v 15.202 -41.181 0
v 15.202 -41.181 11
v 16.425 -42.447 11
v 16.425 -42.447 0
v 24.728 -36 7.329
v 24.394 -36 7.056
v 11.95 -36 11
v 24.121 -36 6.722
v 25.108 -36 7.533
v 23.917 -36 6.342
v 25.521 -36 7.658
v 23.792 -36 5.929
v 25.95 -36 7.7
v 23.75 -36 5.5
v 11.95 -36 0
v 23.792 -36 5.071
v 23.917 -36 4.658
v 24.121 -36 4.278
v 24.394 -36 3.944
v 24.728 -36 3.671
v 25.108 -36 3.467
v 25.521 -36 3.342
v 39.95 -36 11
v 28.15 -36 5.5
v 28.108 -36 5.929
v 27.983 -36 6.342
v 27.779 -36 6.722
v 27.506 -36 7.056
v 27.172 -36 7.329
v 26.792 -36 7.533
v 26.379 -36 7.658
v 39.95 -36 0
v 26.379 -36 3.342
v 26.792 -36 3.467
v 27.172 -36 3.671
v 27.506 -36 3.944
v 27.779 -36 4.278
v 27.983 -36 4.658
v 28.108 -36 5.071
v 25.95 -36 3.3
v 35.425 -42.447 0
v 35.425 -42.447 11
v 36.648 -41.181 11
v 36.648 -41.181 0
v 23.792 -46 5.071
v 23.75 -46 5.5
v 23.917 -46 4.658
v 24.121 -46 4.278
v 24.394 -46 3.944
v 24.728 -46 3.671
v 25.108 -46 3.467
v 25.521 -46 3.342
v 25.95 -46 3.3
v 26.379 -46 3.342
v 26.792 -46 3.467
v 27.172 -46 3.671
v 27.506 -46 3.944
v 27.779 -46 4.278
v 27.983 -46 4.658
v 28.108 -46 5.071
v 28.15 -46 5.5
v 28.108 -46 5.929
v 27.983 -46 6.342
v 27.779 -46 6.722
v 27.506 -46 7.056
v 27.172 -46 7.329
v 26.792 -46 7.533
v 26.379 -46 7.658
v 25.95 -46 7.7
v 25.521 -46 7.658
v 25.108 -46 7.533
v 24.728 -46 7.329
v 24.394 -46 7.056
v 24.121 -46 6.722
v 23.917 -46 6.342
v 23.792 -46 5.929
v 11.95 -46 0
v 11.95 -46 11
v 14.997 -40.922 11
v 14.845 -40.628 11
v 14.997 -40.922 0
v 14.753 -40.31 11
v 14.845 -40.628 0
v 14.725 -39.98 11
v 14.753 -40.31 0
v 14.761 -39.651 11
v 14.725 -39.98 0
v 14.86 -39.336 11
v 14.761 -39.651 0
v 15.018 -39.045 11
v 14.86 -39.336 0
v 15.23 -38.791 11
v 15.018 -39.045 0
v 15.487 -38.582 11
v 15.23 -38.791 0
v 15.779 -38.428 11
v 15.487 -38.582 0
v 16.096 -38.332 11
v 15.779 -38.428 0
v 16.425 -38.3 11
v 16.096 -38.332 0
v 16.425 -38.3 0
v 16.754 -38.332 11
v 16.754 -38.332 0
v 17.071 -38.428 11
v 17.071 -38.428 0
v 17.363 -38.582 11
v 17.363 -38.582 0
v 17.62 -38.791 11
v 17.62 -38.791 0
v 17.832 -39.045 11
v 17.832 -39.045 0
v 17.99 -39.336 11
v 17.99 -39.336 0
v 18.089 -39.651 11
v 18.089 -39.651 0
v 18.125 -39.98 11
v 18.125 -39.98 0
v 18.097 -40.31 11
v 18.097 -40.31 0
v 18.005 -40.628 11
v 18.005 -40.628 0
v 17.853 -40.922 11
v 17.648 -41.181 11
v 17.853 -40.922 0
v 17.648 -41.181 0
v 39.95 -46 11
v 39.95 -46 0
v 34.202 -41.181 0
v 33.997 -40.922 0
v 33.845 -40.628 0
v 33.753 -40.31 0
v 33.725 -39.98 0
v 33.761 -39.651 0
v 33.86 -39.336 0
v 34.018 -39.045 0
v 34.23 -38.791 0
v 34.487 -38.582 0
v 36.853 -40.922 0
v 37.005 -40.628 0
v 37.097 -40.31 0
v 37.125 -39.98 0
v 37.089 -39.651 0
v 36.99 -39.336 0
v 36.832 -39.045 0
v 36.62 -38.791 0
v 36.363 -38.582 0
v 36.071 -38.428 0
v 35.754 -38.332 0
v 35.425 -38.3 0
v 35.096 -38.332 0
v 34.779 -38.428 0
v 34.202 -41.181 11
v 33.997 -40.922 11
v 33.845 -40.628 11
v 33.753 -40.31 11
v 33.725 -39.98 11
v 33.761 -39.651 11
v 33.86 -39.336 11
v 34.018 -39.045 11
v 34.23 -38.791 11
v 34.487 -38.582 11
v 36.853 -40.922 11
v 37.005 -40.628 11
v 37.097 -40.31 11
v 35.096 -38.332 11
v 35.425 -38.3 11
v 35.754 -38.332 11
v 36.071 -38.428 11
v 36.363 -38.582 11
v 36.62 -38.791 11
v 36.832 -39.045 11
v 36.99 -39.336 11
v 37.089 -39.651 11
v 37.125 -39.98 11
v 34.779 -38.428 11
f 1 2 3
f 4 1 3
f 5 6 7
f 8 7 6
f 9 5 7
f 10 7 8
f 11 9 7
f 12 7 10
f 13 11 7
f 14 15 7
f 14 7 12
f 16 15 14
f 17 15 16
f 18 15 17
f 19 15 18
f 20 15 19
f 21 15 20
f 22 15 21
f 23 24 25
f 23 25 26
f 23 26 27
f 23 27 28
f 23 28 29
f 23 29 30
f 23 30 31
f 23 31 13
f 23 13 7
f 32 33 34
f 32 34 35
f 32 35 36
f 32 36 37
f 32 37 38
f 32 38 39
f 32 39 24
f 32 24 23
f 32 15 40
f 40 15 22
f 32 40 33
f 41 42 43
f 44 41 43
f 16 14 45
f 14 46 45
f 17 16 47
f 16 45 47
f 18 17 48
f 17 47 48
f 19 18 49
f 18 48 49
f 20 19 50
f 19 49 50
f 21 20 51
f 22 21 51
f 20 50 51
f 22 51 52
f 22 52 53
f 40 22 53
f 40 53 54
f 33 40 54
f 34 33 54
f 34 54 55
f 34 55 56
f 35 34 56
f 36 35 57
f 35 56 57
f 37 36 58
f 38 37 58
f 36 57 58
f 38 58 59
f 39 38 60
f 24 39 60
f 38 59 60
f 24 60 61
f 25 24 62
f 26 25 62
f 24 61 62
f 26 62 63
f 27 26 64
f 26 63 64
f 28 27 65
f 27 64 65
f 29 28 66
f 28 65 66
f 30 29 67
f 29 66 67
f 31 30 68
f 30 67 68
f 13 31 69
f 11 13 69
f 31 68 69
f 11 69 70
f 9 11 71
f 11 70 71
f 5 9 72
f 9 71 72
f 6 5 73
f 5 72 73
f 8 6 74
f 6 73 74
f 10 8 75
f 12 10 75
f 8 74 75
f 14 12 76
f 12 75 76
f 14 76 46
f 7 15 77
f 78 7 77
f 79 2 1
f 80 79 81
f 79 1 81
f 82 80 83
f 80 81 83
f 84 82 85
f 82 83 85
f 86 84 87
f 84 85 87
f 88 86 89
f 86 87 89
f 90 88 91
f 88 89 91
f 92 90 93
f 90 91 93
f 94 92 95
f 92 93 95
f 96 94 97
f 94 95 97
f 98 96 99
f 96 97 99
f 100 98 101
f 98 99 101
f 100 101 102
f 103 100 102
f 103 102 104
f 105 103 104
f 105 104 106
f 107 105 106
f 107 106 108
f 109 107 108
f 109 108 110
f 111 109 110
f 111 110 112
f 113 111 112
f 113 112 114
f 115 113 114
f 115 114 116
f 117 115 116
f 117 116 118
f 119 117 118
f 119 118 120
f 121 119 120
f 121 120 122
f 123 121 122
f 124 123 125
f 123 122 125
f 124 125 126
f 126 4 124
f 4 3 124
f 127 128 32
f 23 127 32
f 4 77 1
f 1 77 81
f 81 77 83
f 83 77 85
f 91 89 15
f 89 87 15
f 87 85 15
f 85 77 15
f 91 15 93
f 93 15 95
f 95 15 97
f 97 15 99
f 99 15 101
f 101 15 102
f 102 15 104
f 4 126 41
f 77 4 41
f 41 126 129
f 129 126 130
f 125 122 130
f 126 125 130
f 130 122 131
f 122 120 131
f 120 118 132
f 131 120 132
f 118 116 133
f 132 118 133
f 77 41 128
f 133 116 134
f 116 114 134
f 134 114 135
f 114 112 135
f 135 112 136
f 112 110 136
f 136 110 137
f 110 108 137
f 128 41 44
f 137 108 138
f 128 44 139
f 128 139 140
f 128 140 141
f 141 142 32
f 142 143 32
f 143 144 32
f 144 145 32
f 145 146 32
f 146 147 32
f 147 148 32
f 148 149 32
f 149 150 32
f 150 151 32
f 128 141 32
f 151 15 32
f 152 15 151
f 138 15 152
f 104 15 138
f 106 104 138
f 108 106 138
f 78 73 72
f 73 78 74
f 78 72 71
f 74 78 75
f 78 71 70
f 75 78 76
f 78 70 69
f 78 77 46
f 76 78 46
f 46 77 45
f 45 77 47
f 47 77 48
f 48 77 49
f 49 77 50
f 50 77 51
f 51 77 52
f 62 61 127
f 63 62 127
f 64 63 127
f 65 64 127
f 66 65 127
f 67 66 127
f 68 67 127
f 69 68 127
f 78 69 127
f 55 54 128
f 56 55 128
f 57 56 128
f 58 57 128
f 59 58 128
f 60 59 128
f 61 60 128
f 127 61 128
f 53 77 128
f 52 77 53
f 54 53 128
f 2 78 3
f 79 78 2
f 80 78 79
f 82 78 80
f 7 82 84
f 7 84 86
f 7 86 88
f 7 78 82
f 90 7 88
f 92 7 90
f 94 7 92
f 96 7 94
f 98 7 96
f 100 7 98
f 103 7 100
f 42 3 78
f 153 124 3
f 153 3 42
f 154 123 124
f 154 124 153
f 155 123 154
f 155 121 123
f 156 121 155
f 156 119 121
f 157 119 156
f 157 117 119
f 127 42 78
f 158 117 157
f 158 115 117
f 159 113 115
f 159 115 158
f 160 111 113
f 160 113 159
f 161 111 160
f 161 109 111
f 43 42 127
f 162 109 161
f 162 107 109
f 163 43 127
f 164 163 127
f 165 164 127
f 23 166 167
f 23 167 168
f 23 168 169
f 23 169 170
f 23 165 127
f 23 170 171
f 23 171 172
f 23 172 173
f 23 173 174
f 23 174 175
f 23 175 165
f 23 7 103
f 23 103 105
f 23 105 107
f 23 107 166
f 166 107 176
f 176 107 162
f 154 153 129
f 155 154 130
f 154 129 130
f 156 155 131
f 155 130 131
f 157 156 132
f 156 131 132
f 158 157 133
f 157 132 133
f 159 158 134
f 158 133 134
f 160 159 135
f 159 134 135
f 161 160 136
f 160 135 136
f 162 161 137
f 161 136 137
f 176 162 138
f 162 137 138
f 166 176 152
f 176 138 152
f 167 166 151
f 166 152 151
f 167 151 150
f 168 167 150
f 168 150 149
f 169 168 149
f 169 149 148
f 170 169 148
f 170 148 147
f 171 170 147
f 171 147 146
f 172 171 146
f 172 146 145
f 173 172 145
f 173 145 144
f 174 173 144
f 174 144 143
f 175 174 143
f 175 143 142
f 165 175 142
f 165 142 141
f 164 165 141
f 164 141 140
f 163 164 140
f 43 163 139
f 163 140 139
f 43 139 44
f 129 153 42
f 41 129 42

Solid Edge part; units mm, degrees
sketch "Sketch1" plane through (0, 0, 0) normal (0, 0, 1) x (1, 0, 0)
  circle A0 centre (35.425, -40) radius 1.7
  line L0 (11.95, -46) -> (39.95, -46)
  line L1 (39.95, -46) -> (39.95, -36)
  line L2 (11.95, -36) -> (39.95, -36)
  line L3 (11.95, -36) -> (11.95, -46)
  circle A1 centre (16.425, -40) radius 1.7
  dimension "D1" = 3.4
  dimension "D2" = 3.4
extrude "Protrusion1" add sketch "Sketch1" along normal blind 11
sketch "Sketch2" plane through (25.95, -46, 4) normal (0, -1, 0) x (-1, 0, 0)
  circle A0 centre (0, -1.5) radius 2.2
  dimension "D1" = 4.4
  dimension "D2" = 5.5
  dimension "D3" = 14
extrude "Cutout1" cut sketch "Sketch2" against normal through all
sketch "Sketch3" plane through (25.95, -41, 11) normal (0, 0, 1) x (-1, 0, 0)
  line L0 (-9.475, -1) -> (-8.2521, 0.1809)
  line L1 (-8.2521, 0.1809) -> (-9.475, 1.4472)
  line L2 (-9.475, 1.4472) -> (-10.6979, 0.1809)
  line L3 (-10.6979, 0.1809) -> (-9.475, -1)
  line L4 (9.525, -1) -> (10.7479, 0.1809)
  line L5 (10.7479, 0.1809) -> (9.525, 1.4472)
  line L6 (9.525, 1.4472) -> (8.3021, 0.1809)
  line L7 (8.3021, 0.1809) -> (9.525, -1)
extrude "Cutout2" cut sketch "Sketch3" against normal through all
extrude "ExtrudedCutout_3" [suppressed]
properties material "ABS Plastic, medium impact"
